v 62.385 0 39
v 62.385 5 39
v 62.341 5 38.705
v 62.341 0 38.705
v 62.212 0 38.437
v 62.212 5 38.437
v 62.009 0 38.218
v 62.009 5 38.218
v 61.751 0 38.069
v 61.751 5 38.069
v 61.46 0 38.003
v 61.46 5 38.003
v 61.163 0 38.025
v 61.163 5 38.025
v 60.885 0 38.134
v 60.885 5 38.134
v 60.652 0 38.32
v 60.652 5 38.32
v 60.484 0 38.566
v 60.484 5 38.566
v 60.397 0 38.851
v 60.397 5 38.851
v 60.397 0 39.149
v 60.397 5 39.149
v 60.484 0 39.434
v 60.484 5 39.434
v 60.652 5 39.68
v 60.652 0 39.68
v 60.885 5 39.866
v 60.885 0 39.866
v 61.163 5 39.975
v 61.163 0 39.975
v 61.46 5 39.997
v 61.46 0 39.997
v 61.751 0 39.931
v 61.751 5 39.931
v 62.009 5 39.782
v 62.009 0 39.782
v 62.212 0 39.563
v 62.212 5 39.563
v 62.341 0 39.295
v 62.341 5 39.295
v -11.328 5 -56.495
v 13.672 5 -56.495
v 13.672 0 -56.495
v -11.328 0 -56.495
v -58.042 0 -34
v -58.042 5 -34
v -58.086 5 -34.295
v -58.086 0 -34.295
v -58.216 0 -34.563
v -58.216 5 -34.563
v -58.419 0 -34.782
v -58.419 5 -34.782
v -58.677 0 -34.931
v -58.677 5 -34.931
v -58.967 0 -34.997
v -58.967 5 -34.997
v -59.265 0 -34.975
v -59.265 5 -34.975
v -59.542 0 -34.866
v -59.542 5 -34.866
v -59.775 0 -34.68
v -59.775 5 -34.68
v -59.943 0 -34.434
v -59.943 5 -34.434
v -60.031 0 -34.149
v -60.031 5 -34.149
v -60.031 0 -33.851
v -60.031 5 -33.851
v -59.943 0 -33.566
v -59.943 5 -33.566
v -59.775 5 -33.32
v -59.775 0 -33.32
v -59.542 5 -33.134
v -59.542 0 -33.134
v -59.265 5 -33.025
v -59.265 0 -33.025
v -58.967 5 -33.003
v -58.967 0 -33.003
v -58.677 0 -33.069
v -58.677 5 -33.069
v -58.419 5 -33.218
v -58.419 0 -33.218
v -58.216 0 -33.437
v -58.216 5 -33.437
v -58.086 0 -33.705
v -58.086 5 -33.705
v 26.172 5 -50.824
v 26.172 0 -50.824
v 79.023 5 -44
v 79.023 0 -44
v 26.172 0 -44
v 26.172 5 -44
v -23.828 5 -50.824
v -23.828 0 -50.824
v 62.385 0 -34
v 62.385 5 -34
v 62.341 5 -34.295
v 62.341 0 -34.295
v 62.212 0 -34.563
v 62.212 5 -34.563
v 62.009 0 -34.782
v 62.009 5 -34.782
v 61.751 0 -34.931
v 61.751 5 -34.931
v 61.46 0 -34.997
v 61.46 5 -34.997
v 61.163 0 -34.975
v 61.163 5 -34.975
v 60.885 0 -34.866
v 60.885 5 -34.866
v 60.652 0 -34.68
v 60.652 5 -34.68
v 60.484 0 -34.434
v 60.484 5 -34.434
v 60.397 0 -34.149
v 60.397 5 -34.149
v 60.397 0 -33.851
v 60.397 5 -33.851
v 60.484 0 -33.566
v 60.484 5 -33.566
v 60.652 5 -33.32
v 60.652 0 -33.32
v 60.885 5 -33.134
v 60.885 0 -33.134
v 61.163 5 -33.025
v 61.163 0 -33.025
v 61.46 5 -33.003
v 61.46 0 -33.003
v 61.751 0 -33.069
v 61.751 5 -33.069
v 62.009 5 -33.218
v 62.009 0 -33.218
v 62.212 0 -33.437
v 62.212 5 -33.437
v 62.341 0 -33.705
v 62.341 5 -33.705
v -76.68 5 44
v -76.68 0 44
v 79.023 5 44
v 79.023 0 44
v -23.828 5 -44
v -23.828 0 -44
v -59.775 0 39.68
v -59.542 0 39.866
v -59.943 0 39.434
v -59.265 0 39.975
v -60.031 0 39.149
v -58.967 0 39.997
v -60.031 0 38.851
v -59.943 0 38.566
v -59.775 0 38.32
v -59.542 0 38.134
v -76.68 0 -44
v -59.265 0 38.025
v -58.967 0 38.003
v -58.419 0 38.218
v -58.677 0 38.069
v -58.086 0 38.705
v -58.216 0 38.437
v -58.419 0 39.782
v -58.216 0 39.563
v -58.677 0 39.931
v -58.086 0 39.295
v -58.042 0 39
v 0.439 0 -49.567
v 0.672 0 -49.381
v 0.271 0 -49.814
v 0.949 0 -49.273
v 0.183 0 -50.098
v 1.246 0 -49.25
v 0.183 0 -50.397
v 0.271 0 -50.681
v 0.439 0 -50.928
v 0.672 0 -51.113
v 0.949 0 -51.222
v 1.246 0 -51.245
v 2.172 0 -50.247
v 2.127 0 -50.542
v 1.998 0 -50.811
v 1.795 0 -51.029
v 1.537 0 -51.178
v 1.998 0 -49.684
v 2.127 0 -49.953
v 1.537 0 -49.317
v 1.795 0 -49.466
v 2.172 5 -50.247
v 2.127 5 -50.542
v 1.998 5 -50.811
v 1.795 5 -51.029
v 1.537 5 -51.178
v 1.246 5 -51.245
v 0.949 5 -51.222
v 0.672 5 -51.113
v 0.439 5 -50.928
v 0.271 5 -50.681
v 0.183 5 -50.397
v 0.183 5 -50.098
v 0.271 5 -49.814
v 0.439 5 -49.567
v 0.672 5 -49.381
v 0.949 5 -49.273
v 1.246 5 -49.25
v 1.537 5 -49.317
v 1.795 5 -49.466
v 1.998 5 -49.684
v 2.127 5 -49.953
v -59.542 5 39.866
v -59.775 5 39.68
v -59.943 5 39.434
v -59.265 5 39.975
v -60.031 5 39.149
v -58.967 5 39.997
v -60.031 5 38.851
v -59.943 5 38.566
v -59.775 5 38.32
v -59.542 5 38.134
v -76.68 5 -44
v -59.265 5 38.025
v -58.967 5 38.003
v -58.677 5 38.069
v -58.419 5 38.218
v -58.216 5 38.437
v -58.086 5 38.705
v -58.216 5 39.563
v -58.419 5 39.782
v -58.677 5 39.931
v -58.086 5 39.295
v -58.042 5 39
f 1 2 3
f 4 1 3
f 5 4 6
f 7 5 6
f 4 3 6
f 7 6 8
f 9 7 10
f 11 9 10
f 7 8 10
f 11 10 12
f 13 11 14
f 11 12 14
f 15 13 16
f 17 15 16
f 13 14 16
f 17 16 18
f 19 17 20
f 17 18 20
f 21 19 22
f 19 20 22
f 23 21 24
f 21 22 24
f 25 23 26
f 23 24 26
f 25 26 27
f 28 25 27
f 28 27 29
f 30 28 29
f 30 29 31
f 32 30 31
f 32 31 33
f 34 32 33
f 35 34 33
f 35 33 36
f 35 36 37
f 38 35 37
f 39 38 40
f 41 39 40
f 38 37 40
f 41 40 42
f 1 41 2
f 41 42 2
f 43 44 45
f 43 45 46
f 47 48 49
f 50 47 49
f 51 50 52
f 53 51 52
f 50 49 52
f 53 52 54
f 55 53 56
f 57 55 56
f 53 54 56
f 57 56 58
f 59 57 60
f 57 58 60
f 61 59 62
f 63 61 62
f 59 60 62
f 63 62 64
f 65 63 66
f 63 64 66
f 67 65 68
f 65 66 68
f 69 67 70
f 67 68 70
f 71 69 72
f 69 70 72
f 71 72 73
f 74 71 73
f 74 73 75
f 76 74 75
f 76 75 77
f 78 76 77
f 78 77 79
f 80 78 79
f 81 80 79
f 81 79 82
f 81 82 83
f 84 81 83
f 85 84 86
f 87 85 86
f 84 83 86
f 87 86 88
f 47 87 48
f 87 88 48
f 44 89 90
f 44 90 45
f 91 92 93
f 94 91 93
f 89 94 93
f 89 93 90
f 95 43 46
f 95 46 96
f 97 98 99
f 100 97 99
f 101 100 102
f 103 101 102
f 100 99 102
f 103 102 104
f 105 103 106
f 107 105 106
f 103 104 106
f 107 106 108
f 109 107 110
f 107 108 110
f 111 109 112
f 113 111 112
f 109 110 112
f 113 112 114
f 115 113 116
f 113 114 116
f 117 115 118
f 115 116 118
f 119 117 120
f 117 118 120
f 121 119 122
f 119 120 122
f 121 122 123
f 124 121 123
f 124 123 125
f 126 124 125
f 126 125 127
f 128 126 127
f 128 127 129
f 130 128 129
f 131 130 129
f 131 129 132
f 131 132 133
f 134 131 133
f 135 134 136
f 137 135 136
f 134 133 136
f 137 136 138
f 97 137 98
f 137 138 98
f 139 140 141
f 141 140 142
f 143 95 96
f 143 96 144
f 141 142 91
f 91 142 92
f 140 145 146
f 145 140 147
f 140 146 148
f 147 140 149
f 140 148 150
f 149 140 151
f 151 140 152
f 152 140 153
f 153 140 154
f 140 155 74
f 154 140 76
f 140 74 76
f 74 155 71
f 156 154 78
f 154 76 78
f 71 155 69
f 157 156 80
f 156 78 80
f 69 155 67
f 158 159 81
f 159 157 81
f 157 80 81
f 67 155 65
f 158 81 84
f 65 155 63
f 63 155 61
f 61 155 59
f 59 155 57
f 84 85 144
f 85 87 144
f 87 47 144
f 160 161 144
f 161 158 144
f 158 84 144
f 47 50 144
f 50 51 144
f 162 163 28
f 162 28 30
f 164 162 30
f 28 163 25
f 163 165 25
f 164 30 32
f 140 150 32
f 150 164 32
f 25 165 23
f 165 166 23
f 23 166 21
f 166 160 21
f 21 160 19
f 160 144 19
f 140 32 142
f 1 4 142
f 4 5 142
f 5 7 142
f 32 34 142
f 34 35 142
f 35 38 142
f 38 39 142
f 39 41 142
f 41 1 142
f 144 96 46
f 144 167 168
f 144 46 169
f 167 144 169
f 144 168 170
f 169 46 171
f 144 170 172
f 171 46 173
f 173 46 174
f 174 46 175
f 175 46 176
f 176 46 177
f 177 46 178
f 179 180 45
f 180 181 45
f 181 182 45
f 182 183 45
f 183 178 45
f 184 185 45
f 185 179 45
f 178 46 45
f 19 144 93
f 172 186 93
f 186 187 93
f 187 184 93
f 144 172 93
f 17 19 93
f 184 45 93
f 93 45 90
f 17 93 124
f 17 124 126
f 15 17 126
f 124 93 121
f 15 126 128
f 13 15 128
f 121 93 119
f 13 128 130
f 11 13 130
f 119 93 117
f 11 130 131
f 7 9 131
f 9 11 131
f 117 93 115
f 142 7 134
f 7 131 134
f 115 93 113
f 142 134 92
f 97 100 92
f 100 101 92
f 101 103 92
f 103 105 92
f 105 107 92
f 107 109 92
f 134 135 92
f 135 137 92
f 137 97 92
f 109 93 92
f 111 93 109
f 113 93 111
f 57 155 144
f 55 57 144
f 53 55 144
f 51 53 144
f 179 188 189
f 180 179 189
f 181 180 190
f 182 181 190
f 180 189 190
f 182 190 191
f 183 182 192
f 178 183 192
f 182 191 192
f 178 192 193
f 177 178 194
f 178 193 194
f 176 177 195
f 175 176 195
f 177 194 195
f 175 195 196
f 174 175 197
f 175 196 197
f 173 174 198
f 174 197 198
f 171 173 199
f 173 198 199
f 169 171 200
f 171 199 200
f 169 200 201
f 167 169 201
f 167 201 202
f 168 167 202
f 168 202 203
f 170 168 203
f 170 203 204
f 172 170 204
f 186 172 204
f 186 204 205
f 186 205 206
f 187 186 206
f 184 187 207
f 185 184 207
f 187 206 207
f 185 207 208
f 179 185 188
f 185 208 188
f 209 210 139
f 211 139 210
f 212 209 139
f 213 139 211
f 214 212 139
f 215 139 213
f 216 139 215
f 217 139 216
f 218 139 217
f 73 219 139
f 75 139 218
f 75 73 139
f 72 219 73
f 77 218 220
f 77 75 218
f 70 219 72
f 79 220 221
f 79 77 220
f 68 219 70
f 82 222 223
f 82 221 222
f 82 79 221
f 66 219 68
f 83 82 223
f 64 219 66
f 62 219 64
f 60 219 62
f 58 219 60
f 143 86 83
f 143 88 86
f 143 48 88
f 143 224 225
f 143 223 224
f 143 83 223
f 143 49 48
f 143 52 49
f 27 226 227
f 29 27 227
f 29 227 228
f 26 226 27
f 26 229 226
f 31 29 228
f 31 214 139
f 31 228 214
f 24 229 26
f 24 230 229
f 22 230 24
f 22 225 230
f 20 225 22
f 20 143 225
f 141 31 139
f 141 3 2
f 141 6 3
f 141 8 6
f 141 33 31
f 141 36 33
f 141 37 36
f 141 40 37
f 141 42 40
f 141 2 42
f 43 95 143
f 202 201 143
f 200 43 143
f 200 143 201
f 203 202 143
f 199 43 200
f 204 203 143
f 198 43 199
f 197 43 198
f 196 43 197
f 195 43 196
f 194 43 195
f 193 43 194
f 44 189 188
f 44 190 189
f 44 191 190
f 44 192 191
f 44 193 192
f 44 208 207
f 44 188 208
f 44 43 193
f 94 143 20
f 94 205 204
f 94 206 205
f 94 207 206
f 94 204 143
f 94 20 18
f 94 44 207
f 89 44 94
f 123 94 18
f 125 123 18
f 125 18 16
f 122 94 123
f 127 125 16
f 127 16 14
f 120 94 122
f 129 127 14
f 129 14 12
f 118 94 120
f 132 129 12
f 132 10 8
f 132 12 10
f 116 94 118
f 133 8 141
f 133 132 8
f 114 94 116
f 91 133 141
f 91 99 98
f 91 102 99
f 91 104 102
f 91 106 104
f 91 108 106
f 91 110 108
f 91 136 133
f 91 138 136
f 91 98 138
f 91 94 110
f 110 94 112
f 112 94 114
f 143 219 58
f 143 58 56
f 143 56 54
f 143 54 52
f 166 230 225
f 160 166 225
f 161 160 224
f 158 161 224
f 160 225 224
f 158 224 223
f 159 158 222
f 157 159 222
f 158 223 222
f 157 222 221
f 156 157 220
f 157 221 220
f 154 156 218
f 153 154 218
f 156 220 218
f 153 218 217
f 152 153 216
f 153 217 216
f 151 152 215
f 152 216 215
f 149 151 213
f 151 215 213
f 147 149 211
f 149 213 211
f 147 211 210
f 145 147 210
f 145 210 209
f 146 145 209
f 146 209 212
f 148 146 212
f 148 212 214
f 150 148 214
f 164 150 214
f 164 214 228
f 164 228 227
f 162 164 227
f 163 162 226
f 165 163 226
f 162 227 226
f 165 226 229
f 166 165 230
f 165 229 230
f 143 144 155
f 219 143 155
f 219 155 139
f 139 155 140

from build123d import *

# Parameters (mm, degrees)
SKETCH1_W           = 155.702807198
SKETCH1_H           = 58
SKETCH1_R           = 1.5
BOSS_EXTRUDE2_DEPTH = 5
SKETCH2_R           = 1
BOSS_EXTRUDE3_DEPTH = 5
SKETCH3_R           = 1.5
SKETCH3_R_2         = 1
BOSS_EXTRUDE4_DEPTH = 5


with BuildPart() as part:
    # Sketch1 → Boss-Extrude2 (new body)
    with BuildSketch(Plane(origin=(0, 0, 0), x_dir=(1, 0, 0), z_dir=(0, 1, 0))):
        with Locations((1.171695753, -5)):
            Rectangle(SKETCH1_W, SKETCH1_H)
        Polygon((-76.679707846, 44), (-76.679707846, 24), (79.023099352, 24), (79.023099352, 44), (62.885457038, 44), (59.885457038, 44), (-57.542065533, 44), (-60.542065533, 44), align=None)
        with Locations((-59.042065533, 34)):
            Circle(SKETCH1_R, mode=Mode.SUBTRACT)
        with Locations((61.385457038, 34)):
            Circle(SKETCH1_R, mode=Mode.SUBTRACT)
        Polygon((-76.679707846, -44), (-60.542065533, -44), (-57.542065533, -44), (59.885457038, -44), (62.885457038, -44), (79.023099352, -44), (79.023099352, -34), (-76.679707846, -34), align=None)
        with Locations((-59.042065533, -39)):
            Circle(SKETCH1_R, mode=Mode.SUBTRACT)
        with Locations((61.385457038, -39)):
            Circle(SKETCH1_R, mode=Mode.SUBTRACT)
    extrude(amount=BOSS_EXTRUDE2_DEPTH)

    # Sketch2 → Boss-Extrude3 (add)
    with BuildSketch(Plane(origin=(0, 5, 0), x_dir=(1, 0, 0), z_dir=(0, 1, 0))):
        Polygon((-23.828304247, 44), (26.171695753, 44), (26.171695753, 50.823606938), (13.671695753, 56.49492606), (-11.328304247, 56.49492606), (-23.828304247, 50.823606938), align=None)
        with Locations((1.171695753, 50.24746303)):
            Circle(SKETCH2_R, mode=Mode.SUBTRACT)
    extrude(amount=-BOSS_EXTRUDE3_DEPTH)

    # Sketch3 → Boss-Extrude4 (add)
    with BuildSketch(Plane(origin=(0, 5, 0), x_dir=(1, 0, 0), z_dir=(0, 1, 0))):
        with Locations((61.385457038, 34)):
            Circle(SKETCH3_R)
        with Locations((61.385457038, 34)):
            Circle(SKETCH3_R_2, mode=Mode.SUBTRACT)
        with Locations((61.385457038, -39)):
            Circle(SKETCH3_R)
        with Locations((61.385457038, -39)):
            Circle(SKETCH3_R_2, mode=Mode.SUBTRACT)
        with Locations((-59.042065533, -39)):
            Circle(SKETCH3_R)
        with Locations((-59.042065533, -39)):
            Circle(SKETCH3_R_2, mode=Mode.SUBTRACT)
        with Locations((-59.042065533, 34)):
            Circle(SKETCH3_R)
        with Locations((-59.042065533, 34)):
            Circle(SKETCH3_R_2, mode=Mode.SUBTRACT)
    extrude(amount=-BOSS_EXTRUDE4_DEPTH)


solid = part.part
